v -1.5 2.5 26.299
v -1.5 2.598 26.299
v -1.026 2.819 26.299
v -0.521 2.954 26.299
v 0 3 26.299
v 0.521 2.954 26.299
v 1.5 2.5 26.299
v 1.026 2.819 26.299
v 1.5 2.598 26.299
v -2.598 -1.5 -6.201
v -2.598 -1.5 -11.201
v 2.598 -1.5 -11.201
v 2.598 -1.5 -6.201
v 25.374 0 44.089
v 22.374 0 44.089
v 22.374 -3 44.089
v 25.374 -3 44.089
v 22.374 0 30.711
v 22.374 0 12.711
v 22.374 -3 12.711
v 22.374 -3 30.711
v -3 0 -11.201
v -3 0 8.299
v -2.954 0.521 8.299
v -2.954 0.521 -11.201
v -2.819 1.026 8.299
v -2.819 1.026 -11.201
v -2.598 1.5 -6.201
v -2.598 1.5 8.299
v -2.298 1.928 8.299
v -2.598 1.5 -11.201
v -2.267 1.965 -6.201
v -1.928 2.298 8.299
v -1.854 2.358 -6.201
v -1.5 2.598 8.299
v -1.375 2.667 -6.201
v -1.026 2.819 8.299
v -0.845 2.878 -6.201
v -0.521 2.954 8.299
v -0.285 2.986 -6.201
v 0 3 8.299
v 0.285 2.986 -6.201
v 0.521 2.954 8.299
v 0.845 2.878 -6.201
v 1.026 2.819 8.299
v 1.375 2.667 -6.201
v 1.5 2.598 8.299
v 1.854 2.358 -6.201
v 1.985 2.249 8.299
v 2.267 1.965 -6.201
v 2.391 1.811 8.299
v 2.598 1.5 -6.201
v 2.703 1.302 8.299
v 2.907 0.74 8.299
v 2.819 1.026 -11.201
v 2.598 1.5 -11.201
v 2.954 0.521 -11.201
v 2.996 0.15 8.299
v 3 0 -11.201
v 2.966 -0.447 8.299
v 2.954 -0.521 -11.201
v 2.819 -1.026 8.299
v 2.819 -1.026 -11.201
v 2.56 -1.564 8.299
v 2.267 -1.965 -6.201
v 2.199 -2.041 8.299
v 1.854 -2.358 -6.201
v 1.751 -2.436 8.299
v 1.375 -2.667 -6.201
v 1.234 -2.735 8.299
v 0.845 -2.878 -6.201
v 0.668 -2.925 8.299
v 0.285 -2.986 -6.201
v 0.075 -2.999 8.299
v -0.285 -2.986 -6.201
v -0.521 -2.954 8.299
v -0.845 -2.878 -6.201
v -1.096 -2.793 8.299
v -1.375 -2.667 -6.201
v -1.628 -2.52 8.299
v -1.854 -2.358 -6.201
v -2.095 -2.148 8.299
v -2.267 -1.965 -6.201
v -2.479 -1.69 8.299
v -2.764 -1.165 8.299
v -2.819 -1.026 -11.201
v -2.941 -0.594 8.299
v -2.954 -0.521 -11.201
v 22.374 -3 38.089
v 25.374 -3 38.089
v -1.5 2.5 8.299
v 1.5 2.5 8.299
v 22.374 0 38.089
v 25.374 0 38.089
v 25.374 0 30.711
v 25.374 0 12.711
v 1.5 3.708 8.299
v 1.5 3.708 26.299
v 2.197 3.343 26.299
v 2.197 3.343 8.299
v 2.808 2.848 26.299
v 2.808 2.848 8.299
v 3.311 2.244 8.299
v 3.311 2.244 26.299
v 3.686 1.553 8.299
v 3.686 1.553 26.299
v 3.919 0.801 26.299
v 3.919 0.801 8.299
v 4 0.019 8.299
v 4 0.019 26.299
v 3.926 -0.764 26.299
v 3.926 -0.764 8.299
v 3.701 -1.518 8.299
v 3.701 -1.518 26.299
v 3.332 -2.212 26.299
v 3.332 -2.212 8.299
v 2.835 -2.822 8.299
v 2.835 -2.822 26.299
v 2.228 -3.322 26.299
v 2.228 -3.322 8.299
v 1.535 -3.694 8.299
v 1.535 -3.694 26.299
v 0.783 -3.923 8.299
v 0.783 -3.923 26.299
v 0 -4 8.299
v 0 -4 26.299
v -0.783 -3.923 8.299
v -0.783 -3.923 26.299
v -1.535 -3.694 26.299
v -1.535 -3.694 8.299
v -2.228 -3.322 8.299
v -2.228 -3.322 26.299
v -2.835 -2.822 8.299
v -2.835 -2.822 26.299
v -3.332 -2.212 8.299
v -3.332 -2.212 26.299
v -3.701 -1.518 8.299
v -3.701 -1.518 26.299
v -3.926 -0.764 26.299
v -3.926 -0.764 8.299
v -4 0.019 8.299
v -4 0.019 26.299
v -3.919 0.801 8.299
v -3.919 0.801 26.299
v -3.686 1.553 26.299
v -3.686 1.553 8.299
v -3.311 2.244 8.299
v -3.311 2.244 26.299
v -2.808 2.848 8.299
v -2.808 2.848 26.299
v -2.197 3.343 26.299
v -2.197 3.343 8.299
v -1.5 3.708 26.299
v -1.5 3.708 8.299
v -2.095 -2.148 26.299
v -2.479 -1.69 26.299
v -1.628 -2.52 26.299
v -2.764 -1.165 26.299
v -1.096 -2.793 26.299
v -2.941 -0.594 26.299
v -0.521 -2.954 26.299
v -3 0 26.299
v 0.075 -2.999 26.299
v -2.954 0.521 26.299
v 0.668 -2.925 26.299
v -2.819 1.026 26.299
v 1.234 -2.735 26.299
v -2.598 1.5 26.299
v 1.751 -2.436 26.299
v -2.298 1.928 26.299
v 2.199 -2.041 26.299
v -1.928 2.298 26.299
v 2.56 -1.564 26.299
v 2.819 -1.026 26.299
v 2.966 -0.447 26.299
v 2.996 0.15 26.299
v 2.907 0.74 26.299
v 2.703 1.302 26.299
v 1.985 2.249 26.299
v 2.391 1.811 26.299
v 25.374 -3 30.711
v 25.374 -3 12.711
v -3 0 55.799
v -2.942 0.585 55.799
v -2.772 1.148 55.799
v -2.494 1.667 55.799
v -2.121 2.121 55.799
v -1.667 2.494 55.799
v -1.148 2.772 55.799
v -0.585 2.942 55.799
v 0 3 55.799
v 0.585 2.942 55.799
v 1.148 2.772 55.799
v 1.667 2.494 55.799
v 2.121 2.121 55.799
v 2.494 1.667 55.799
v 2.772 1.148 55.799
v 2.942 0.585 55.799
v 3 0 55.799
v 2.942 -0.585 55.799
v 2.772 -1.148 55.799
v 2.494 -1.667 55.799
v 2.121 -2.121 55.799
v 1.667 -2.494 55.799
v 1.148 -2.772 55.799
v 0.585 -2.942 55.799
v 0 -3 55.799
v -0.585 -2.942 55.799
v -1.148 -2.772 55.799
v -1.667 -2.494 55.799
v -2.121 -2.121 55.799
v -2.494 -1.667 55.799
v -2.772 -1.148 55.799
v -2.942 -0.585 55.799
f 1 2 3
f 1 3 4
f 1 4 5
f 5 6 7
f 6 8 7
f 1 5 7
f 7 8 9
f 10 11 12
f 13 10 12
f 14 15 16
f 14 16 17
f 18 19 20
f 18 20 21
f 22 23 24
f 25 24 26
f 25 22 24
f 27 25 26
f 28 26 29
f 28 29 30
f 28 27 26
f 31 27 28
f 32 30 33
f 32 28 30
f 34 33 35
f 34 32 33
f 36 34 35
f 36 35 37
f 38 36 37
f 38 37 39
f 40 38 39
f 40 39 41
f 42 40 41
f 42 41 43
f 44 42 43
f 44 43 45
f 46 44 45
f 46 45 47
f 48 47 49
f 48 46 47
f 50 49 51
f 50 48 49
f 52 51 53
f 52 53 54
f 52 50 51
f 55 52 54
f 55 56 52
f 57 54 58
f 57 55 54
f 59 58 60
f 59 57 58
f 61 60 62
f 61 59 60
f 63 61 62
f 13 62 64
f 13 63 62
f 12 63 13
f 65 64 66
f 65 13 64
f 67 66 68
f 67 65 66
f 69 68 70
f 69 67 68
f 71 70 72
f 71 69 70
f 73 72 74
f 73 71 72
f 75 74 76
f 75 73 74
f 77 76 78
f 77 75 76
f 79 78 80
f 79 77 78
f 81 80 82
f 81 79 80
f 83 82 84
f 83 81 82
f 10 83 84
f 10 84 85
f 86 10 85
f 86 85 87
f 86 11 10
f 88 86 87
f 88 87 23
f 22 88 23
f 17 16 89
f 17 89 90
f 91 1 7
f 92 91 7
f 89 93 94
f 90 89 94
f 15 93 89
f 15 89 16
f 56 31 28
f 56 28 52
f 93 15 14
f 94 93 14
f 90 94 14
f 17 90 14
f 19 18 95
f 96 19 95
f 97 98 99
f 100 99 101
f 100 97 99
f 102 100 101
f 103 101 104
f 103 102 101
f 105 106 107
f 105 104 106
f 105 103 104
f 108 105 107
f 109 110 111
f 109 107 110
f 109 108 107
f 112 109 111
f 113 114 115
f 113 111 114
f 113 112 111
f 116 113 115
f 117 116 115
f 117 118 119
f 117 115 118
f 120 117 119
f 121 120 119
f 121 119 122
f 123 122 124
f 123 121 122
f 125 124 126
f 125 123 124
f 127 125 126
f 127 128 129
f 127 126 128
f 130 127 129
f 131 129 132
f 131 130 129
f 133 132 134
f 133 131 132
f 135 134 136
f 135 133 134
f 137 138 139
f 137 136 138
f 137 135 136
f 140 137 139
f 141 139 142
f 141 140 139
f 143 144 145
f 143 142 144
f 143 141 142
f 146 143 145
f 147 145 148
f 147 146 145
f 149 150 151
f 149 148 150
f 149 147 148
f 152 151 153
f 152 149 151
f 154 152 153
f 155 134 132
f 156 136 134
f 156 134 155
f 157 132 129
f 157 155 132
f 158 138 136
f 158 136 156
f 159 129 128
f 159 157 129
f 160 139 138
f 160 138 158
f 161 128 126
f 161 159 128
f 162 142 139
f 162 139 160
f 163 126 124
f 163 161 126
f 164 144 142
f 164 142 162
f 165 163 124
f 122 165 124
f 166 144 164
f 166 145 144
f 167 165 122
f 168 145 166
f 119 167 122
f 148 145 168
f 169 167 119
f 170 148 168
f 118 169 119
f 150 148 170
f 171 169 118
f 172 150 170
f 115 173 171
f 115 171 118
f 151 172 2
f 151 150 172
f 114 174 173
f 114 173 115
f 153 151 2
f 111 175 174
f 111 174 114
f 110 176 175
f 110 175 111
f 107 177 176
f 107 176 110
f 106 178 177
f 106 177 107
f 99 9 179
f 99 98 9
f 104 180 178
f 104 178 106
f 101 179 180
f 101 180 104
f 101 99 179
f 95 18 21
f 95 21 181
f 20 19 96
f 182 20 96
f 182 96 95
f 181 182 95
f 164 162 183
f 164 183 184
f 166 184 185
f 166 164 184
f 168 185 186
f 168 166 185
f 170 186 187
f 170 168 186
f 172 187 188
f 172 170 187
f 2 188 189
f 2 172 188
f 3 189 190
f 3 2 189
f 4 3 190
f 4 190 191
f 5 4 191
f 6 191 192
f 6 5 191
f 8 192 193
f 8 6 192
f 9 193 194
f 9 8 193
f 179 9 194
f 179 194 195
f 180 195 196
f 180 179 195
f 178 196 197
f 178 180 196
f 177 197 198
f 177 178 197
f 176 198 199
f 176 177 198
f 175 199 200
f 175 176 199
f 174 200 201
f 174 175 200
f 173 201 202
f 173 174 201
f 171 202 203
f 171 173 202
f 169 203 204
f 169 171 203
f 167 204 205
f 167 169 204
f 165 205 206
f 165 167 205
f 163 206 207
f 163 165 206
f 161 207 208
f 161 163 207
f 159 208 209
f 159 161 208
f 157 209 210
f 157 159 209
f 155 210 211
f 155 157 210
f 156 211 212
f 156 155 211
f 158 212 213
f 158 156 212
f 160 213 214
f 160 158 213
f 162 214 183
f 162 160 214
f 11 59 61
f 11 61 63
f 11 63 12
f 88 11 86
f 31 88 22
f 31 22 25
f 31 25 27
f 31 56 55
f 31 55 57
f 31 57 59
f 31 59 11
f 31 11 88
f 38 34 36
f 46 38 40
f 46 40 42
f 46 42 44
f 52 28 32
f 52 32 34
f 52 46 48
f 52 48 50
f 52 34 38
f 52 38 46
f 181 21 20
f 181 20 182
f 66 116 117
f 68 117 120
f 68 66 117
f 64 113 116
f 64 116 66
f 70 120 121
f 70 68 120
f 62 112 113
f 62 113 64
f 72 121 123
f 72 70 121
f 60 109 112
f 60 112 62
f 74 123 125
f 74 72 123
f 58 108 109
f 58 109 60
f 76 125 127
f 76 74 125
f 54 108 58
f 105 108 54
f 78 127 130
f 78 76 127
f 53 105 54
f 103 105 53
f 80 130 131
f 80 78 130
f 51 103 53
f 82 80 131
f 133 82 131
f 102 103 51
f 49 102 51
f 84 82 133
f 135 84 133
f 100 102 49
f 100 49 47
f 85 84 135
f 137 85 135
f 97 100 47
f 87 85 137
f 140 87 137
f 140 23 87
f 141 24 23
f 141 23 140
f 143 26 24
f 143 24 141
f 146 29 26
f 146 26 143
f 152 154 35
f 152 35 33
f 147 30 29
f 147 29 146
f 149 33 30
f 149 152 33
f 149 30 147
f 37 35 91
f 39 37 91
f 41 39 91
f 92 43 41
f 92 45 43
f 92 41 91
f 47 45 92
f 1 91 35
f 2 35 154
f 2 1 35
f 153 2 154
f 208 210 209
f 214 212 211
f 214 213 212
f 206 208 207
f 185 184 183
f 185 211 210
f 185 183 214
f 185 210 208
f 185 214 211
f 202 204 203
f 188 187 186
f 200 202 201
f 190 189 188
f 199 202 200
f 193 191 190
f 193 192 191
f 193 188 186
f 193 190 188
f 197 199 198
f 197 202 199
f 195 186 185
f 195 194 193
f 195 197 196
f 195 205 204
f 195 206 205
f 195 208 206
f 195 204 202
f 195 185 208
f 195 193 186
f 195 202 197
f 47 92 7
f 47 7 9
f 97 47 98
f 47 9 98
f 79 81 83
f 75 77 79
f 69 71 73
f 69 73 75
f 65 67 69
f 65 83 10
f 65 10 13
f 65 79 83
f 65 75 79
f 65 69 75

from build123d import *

# Parameters (mm, degrees)
F2_W     = 3
F2_H     = 3
F3_DEPTH = 18
F4_W     = 3
F4_H     = 6
F4_H_2   = 18
F5_DEPTH = 3
F6_W     = 10
F6_H     = 4
F7_DEPTH = 5


with BuildPart() as f1:
    # F0 (on Front) → F1 (revolve)
    with BuildSketch(Plane.XZ):
        Polygon((0, -11.201051), (0, 55.798949), (-3, 55.798949), (-3, 26.298949), (-4, 26.298949), (-4, 8.298949), (-3, 8.298949), (-3, -11.201051), align=None)
    revolve(axis=Axis((0, 0, 15.213801), (0, 0, -1)))

    # F2 (on face) → F3 (cut)
    with BuildSketch(Plane.XY.offset(26.298949)):
        with Locations((0, 4)):
            Rectangle(F2_W, F2_H)
    extrude(amount=-F3_DEPTH, mode=Mode.SUBTRACT)

    # F6 (on face) → F7 (cut)
    with BuildSketch(Plane(origin=(0, 0, -11.201051), x_dir=(1, 0, 0), z_dir=(0, 0, -1))):
        with Locations((0, -3.5)):
            Rectangle(F6_W, F6_H)
        with Locations((0, 3.5)):
            Rectangle(F6_W, F6_H)
    extrude(amount=-F7_DEPTH, mode=Mode.SUBTRACT)


with BuildPart() as f5:
    # F4 (on Front) → F5 (new body)
    with BuildSketch(Plane.XZ):
        with Locations((23.873695, 41.089317)):
            Rectangle(F4_W, F4_H)
        with Locations((23.873695, 21.711195)):
            Rectangle(F4_W, F4_H_2)
    extrude(amount=F5_DEPTH)


solid = Compound([f1.part, f5.part])
